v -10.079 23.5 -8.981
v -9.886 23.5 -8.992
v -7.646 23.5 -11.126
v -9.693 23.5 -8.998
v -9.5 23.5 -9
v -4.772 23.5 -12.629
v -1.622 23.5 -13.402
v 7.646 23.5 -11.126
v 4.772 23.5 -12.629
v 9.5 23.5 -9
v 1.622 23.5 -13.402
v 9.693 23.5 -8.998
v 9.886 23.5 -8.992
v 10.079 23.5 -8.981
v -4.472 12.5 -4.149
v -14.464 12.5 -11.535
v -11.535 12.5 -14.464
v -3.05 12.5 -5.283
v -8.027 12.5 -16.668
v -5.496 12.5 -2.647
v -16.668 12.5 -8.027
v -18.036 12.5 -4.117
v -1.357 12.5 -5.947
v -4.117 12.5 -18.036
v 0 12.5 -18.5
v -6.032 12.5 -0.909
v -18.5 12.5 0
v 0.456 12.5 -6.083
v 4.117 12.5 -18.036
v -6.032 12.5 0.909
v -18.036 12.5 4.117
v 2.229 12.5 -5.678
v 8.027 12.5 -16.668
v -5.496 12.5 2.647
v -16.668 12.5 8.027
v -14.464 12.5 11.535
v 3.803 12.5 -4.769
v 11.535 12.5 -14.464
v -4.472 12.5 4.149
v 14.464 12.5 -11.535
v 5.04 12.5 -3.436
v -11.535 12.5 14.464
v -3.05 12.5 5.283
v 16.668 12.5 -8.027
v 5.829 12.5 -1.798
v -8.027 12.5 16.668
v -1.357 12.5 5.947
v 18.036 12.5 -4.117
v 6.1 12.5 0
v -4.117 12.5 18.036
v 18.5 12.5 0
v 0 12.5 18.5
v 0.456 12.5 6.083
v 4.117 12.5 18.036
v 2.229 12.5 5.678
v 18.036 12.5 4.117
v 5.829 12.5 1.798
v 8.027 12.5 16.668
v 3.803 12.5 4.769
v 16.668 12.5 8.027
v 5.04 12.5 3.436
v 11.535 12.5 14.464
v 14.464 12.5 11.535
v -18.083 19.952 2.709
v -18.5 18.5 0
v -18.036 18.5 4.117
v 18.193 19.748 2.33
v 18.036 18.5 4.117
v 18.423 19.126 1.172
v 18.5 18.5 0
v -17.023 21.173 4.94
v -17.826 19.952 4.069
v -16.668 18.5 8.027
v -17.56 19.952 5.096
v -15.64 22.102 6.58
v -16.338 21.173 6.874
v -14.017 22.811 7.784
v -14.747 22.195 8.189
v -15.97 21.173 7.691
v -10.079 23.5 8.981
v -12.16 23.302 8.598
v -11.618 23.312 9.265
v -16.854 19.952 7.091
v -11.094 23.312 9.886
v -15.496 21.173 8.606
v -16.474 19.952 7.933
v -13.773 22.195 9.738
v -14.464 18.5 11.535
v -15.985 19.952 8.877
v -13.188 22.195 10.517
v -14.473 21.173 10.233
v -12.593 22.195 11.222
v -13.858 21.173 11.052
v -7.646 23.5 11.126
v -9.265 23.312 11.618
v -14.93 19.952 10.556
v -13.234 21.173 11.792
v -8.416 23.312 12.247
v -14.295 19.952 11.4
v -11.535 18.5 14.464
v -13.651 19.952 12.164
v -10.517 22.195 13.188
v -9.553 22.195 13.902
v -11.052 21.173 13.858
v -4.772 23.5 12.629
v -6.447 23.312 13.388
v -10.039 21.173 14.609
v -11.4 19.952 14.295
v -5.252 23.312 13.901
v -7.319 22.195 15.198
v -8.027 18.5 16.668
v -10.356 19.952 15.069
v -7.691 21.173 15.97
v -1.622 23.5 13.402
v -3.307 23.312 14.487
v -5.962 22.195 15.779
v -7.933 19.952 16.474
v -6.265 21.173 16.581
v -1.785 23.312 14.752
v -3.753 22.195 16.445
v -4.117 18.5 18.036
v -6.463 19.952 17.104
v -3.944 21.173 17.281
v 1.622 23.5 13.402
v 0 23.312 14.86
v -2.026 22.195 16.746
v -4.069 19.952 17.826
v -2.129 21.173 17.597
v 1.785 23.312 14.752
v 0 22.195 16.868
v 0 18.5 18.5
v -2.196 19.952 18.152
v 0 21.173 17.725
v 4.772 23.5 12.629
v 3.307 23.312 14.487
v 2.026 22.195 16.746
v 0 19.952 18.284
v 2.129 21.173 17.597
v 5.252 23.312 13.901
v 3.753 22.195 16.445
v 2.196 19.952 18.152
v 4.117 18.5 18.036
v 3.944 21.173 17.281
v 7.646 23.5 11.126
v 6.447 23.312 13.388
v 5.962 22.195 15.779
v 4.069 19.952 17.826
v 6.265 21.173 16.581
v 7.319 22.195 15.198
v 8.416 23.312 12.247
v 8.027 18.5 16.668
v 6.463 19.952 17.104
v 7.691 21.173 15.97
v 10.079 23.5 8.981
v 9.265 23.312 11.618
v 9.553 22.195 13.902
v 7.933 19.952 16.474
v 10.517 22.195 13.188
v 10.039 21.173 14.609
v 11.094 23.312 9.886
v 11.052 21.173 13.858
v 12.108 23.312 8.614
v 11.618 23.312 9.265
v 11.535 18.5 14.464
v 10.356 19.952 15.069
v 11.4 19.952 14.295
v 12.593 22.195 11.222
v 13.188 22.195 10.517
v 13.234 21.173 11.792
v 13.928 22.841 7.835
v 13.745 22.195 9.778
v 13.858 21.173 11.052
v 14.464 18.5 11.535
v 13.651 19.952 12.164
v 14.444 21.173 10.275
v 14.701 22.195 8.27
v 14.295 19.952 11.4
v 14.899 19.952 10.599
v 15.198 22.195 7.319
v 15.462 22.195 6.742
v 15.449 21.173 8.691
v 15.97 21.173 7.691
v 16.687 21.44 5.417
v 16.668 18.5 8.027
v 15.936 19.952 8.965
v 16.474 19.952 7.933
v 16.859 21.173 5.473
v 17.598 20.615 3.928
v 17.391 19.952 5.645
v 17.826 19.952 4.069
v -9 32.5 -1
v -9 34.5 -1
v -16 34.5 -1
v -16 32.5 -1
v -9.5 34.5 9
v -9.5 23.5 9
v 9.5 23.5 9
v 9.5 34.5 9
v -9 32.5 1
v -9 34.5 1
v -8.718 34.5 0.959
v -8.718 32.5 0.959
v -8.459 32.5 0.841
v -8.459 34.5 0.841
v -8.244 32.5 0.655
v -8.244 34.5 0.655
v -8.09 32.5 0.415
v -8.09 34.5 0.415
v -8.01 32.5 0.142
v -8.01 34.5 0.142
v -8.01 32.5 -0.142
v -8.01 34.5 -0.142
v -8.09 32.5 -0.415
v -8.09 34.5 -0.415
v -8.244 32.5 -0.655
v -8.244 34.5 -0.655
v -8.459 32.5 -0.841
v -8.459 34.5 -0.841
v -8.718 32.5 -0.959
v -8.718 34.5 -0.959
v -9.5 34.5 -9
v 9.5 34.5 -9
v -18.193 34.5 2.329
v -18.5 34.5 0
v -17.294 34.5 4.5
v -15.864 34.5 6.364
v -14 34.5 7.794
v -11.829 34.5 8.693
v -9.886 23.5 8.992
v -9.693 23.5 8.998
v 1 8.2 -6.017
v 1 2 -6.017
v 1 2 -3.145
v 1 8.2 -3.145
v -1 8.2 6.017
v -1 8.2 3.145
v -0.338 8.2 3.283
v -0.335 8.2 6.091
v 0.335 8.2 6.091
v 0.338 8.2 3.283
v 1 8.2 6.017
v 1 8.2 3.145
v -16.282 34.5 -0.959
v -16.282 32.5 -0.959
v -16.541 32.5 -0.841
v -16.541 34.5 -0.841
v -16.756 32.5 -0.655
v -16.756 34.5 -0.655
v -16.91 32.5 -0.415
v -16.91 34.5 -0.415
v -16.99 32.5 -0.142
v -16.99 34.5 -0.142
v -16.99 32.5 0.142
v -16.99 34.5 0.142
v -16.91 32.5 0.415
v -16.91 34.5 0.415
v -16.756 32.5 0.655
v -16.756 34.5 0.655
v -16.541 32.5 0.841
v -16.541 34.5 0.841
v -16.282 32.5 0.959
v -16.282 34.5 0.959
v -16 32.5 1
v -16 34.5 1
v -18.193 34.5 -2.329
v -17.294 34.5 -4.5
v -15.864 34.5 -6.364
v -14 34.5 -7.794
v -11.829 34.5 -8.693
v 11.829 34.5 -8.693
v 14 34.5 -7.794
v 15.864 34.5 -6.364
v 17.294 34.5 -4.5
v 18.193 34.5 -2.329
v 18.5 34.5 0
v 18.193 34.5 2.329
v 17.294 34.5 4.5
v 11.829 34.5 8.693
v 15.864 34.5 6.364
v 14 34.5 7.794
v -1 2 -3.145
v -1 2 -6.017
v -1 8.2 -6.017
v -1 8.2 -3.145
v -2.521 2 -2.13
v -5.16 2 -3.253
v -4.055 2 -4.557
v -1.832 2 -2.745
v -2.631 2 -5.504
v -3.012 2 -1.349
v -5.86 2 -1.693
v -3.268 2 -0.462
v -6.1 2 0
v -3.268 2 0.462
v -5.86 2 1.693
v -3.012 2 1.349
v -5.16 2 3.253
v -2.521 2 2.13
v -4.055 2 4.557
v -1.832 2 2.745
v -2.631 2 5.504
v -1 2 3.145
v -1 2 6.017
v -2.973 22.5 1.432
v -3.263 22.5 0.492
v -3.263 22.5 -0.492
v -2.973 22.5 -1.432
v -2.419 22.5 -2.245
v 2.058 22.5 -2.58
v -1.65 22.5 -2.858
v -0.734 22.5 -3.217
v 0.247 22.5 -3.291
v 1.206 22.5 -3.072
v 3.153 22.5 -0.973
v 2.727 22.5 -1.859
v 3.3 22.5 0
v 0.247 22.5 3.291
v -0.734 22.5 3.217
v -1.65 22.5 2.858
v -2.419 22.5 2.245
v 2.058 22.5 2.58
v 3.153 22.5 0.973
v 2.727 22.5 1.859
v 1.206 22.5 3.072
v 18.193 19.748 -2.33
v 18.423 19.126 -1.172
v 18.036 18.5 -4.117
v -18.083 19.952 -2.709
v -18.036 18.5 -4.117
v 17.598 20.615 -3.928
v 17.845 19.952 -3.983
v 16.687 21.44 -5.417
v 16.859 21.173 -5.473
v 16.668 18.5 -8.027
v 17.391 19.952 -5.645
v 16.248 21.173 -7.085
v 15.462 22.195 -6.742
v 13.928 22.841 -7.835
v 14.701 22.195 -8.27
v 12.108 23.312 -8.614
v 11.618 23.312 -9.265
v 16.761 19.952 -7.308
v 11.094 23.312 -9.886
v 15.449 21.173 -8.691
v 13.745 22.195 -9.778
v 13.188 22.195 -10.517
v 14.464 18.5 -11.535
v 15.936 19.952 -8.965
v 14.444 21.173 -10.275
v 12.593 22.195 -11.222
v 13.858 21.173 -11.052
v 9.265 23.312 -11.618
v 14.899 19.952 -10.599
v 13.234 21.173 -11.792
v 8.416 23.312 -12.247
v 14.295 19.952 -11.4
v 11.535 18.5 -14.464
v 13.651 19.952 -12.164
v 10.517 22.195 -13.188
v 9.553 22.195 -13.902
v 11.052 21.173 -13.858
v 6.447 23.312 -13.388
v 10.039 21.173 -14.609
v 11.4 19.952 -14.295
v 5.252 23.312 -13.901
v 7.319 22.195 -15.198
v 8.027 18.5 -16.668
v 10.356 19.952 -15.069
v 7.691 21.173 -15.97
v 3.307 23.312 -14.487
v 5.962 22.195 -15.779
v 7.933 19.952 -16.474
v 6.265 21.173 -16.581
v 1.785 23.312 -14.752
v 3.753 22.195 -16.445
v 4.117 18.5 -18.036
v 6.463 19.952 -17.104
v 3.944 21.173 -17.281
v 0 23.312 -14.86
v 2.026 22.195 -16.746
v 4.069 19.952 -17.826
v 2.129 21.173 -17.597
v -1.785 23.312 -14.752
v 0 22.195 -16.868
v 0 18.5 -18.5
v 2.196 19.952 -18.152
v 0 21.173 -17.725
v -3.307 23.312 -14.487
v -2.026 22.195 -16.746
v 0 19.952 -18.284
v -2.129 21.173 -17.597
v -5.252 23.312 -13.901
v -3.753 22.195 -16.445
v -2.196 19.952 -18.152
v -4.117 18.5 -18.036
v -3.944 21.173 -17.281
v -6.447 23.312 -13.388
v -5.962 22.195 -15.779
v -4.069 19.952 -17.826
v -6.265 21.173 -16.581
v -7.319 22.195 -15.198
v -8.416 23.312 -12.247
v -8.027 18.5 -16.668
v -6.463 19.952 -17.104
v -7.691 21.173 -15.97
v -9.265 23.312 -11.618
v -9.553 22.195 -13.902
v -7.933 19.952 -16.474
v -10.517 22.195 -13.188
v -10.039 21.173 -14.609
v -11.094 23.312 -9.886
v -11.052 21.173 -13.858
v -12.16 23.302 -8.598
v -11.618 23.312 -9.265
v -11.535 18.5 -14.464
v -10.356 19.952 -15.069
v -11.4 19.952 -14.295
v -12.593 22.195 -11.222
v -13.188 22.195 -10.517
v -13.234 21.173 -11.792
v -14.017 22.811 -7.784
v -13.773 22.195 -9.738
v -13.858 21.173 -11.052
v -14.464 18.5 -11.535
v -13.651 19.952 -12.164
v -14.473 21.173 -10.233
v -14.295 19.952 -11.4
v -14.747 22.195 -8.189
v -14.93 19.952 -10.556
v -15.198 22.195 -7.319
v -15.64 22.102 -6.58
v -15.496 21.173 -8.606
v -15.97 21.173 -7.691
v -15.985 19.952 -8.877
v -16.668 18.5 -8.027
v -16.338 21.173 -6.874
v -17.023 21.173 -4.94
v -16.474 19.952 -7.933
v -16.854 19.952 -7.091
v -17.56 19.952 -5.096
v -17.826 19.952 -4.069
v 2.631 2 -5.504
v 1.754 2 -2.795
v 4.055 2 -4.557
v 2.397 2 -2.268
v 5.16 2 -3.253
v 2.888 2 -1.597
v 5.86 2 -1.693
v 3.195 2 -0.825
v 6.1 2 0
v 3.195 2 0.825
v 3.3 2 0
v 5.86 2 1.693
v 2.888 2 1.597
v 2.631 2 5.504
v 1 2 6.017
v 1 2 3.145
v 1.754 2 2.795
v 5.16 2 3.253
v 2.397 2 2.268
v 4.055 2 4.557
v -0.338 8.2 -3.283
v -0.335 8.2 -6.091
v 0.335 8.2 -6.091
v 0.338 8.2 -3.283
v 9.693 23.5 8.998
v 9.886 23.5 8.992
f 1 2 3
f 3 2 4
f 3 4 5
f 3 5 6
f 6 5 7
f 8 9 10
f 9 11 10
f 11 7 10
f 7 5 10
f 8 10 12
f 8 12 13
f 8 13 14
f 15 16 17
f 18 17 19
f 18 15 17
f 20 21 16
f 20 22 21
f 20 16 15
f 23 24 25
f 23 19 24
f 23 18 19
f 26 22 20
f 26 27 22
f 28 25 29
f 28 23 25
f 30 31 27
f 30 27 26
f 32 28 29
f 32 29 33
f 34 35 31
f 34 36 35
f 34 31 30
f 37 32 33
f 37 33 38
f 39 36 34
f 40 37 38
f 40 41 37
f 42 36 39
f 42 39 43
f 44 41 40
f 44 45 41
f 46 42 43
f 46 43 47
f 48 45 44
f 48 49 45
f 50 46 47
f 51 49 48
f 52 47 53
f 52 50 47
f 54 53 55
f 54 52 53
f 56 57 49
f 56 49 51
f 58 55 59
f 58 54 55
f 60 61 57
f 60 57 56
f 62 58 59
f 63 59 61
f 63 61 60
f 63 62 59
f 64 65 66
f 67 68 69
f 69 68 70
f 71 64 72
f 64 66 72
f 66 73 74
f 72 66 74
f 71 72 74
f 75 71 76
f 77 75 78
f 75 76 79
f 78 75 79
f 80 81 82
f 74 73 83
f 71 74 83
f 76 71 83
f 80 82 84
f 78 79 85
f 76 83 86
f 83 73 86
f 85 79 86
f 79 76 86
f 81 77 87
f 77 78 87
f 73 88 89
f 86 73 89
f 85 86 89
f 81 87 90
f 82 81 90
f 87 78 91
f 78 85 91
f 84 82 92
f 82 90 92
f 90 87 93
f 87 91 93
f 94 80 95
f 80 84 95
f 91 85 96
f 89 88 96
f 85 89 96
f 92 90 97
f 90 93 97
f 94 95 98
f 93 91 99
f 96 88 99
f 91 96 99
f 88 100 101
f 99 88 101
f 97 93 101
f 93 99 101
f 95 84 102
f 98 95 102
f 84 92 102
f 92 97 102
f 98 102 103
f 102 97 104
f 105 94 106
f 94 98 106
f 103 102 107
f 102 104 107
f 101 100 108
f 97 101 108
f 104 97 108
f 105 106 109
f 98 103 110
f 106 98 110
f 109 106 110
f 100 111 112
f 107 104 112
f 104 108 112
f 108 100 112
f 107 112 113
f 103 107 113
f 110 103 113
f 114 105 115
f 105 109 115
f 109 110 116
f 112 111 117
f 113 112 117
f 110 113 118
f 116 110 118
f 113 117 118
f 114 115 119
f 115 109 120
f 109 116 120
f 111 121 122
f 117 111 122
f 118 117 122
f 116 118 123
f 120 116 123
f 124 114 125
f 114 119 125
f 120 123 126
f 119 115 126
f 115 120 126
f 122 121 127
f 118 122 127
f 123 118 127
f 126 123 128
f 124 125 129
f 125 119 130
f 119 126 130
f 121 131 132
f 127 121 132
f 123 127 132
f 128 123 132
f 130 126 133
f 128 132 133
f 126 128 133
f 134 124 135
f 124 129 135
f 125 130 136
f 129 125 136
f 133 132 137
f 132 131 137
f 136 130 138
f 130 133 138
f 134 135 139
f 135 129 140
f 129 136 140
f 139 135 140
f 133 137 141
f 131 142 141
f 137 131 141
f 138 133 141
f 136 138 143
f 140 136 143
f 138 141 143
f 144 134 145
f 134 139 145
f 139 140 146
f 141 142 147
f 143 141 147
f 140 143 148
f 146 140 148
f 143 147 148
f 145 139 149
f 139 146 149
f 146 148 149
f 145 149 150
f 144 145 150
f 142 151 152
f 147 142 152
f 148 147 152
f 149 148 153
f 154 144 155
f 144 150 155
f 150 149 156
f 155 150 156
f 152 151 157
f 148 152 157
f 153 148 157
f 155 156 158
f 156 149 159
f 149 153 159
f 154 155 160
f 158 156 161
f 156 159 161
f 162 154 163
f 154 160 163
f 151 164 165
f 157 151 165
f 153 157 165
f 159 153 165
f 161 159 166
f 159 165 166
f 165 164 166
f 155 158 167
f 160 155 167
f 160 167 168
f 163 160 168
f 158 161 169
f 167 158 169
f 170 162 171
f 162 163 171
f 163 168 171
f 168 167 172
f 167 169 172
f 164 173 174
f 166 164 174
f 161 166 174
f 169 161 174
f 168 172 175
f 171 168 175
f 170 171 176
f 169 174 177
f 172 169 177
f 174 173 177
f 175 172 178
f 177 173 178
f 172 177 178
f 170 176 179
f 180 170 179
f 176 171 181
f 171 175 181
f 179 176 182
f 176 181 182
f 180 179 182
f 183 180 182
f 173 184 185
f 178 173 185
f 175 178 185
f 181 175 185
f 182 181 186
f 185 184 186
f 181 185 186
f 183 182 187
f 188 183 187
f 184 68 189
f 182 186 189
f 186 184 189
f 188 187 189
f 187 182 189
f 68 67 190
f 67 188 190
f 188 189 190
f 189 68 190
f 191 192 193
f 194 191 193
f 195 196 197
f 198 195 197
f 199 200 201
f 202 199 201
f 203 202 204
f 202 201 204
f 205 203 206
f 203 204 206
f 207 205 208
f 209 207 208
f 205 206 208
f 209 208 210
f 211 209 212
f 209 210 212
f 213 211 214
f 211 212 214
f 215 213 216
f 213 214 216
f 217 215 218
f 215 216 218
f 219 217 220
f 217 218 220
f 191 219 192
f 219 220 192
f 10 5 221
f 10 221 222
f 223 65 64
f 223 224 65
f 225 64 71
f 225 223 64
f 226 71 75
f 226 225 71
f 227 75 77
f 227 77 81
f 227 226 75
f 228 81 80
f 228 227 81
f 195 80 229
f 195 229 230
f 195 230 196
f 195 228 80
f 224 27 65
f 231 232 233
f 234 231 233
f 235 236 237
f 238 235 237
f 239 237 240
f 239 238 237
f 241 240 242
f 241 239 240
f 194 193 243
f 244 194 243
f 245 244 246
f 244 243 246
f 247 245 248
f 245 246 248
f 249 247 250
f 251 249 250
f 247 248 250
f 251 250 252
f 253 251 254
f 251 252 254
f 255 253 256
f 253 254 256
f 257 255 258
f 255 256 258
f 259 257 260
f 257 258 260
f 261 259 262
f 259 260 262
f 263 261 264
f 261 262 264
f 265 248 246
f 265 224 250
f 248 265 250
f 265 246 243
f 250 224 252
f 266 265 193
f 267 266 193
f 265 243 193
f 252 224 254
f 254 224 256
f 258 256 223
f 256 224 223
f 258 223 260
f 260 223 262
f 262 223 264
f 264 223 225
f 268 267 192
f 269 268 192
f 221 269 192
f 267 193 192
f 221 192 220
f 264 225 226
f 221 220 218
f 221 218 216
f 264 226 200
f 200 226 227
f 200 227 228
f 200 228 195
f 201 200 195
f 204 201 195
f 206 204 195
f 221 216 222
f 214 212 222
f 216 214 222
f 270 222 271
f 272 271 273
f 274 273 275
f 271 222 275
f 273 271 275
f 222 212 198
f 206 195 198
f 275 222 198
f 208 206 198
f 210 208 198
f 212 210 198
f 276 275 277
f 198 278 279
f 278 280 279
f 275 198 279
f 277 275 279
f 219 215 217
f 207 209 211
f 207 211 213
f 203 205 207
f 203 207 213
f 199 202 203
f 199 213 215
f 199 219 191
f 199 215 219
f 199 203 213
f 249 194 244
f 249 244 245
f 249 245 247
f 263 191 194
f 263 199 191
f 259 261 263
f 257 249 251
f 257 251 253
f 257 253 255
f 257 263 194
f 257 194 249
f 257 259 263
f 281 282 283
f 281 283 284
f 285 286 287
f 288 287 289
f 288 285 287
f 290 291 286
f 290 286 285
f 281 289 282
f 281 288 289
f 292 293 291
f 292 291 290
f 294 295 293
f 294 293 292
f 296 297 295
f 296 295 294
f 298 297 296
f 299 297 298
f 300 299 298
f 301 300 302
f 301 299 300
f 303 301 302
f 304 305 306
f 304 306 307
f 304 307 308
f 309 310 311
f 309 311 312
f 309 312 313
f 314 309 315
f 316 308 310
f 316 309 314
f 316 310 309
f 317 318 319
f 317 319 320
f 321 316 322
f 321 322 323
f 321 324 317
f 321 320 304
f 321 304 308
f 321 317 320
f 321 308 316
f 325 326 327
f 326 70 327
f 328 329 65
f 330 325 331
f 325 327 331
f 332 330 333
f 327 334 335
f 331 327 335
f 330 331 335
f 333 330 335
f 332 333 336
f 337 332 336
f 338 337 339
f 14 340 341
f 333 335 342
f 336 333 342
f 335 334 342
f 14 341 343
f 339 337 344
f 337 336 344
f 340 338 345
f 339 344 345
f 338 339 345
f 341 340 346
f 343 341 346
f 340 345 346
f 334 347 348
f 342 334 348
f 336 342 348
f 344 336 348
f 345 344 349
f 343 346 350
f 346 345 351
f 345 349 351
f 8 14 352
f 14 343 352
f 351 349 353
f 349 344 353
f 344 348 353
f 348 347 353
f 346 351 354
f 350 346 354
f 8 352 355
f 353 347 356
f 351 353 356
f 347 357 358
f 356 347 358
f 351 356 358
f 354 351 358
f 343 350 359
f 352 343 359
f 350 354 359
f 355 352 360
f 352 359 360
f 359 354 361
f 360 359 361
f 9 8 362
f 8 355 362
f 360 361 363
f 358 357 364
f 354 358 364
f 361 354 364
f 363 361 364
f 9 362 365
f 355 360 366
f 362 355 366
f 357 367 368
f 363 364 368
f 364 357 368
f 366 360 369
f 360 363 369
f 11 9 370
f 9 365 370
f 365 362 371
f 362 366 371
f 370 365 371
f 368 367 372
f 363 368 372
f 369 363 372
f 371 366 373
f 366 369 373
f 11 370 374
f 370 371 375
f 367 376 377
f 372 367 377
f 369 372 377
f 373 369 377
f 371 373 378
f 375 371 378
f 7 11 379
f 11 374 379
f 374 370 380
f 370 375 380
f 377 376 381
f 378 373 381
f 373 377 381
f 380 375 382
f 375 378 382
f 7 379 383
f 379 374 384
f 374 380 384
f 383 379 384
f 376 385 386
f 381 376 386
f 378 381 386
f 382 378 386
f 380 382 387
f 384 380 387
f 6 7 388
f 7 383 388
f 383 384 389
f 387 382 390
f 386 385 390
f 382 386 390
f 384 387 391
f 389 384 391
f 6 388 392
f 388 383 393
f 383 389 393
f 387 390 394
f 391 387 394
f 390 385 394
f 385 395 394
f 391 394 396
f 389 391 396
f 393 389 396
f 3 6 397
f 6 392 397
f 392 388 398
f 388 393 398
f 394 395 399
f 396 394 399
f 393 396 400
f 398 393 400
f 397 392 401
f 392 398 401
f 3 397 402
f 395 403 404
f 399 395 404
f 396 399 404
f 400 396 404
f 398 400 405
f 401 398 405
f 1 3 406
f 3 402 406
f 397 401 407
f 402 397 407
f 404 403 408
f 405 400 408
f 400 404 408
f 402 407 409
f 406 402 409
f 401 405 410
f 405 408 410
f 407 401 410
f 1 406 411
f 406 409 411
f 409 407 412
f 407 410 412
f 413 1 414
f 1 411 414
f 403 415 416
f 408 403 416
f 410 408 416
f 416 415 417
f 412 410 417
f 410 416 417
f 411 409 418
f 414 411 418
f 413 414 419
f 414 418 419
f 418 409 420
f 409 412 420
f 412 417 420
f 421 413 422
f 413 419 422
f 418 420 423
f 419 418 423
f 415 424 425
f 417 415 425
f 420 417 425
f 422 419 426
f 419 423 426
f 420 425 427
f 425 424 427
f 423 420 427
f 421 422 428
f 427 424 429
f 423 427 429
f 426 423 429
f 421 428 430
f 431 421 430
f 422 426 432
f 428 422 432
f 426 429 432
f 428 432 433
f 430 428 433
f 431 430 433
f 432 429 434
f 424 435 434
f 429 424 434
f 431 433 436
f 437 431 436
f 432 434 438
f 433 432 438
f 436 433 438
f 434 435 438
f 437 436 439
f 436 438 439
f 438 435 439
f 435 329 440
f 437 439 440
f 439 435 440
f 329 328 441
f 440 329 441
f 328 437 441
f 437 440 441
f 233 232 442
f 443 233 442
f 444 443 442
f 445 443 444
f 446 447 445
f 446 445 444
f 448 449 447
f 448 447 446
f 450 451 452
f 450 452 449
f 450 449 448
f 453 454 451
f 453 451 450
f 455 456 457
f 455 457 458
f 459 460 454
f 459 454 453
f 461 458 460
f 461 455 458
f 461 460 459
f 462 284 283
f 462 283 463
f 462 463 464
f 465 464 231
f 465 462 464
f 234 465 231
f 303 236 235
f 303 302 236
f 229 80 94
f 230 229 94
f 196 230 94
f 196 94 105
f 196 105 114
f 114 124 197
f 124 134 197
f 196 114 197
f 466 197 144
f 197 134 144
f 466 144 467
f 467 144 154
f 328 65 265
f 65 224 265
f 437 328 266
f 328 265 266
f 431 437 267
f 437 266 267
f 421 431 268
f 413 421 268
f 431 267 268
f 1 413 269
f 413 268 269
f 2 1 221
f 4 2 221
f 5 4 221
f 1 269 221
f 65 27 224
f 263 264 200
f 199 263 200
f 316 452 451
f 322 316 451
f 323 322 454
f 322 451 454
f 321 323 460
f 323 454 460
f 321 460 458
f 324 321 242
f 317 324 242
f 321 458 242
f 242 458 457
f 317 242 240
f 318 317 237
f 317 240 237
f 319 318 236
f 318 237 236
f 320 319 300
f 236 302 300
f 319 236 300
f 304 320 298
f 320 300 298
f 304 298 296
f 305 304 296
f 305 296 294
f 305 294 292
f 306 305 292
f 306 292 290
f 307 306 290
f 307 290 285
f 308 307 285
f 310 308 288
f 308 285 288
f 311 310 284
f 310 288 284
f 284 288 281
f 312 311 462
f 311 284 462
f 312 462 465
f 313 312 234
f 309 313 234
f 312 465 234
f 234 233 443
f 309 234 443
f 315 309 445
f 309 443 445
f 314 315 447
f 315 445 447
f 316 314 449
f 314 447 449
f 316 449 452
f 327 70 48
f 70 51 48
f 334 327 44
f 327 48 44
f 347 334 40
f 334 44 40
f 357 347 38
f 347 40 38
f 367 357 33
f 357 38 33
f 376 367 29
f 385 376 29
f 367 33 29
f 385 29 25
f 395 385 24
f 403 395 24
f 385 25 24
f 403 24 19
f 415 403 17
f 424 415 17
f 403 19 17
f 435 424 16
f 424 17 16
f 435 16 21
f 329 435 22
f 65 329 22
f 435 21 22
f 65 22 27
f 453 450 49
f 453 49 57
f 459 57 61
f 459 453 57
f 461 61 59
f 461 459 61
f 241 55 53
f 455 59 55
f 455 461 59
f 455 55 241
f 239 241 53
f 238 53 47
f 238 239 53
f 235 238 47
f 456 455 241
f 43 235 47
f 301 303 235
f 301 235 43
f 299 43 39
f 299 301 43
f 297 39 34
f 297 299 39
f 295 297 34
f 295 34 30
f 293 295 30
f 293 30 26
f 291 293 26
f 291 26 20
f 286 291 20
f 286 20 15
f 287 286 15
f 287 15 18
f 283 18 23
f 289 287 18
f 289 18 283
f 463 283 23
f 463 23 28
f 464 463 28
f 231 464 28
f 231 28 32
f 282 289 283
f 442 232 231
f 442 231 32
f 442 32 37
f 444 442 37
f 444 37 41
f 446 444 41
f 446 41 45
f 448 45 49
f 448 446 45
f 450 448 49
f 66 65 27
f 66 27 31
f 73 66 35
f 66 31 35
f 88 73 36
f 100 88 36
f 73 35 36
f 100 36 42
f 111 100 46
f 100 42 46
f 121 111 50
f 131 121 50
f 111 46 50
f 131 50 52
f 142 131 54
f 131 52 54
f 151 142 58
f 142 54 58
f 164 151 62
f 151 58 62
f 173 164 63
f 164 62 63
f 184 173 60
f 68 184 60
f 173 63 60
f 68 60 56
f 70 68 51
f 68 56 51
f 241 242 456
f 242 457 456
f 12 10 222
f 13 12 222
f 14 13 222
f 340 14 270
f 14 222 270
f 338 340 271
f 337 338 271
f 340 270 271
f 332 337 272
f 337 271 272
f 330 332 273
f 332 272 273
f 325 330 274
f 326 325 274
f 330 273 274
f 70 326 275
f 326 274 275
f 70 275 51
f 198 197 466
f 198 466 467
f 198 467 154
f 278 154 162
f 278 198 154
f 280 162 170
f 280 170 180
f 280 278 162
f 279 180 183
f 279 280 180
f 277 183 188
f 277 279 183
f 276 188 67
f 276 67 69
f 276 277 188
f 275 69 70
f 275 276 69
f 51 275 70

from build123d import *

# Parameters (mm, degrees)
F0_R      = 6.1
F0_R_2    = 3.3
F1_DEPTH  = 20
F4_DEPTH  = 2
F6_W      = 37
F6_H      = 18
F7_DEPTH  = 22
F8_R      = 8.99999
F9_R      = 8.99999
F10_R     = 8.99999
F12_W     = 2
F12_H     = 13
F13_DEPTH = 8.2
F14_R     = 3.3
F15_DEPTH = 10
F17_DEPTH = 2


# Not quite as in the source:
# - a fillet or chamfer is up to 0.001 mm smaller than in the source, because OpenCascade refuses the exact size


with BuildPart() as f1:
    # F0 (on Front) → F1 (new body)
    with BuildSketch(Plane.XZ):
        Circle(F0_R)
        Circle(F0_R_2, mode=Mode.SUBTRACT)
    extrude(amount=-F1_DEPTH)

    # F2 (on Top) → F3 (revolve)
    with BuildSketch(Plane.XY):
        with BuildLine():
            Line((-18.5, 12.5), (0, 12.5))
            Line((0, 12.5), (0, 23.5))
            Line((0, 23.5), (-13.5, 23.5))
            ThreePointArc((-13.5, 23.5), (-17.0355339059, 22.0355339059), (-18.5, 18.5))
            Line((-18.5, 18.5), (-18.5, 12.5))
        make_face()
    revolve(axis=Axis((0, 18, 0), (0, 1, 0)))

    # F0 (on Front) → F4 (cut)
    with BuildSketch(Plane.XZ):
        Circle(F0_R)
        Circle(F0_R_2, mode=Mode.SUBTRACT)
    extrude(amount=-F4_DEPTH, mode=Mode.SUBTRACT)

    # F6 (on offset) → F7 (join)
    with BuildSketch(Plane.XZ.offset(-12.5)):
        Rectangle(F6_W, F6_H)
    extrude(amount=-F7_DEPTH)

    # F8 (radius 9 in the source; OpenCascade refuses exactly that, so slightly less here)
    f8_edges = [f1.edges().sort_by_distance(p)[0] for p in [
        (-18.5, 23.5, -9),
    ]]
    fillet(f8_edges, radius=F8_R)

    # F9 (radius 9 in the source; OpenCascade refuses exactly that, so slightly less here)
    f9_edges = [f1.edges().sort_by_distance(p)[0] for p in [
        (-18.5, 23.5, 9),
    ]]
    fillet(f9_edges, radius=F9_R)

    # F10 (radius 9 in the source; OpenCascade refuses exactly that, so slightly less here)
    f10_edges = [f1.edges().sort_by_distance(p)[0] for p in [
        (18.5, 23.5, -9),
        (18.5, 23.5, 9),
    ]]
    fillet(f10_edges, radius=F10_R)

    # F12 (on face) → F13 (cut)
    with BuildSketch(Plane.XZ):
        Rectangle(F12_W, F12_H)
    extrude(amount=-F13_DEPTH, mode=Mode.SUBTRACT)

    # F14 (on face) → F15 (cut)
    with BuildSketch(Plane.XZ.offset(-12.5)):
        Circle(F14_R)
    extrude(amount=-F15_DEPTH, mode=Mode.SUBTRACT)

    # F16 (on offset) → F17 (cut)
    with BuildSketch(Plane(origin=(0, 34.5, 0), x_dir=(-1, 0, 0), z_dir=(0, 1, 0))):
        with BuildLine():
            ThreePointArc((16, -1), (17, 0), (16, 1))
            Line((16, 1), (9, 1))
            ThreePointArc((9, 1), (8, 0), (9, -1))
            Line((9, -1), (16, -1))
        make_face()
    extrude(amount=-F17_DEPTH, mode=Mode.SUBTRACT)


solid = f1.part
